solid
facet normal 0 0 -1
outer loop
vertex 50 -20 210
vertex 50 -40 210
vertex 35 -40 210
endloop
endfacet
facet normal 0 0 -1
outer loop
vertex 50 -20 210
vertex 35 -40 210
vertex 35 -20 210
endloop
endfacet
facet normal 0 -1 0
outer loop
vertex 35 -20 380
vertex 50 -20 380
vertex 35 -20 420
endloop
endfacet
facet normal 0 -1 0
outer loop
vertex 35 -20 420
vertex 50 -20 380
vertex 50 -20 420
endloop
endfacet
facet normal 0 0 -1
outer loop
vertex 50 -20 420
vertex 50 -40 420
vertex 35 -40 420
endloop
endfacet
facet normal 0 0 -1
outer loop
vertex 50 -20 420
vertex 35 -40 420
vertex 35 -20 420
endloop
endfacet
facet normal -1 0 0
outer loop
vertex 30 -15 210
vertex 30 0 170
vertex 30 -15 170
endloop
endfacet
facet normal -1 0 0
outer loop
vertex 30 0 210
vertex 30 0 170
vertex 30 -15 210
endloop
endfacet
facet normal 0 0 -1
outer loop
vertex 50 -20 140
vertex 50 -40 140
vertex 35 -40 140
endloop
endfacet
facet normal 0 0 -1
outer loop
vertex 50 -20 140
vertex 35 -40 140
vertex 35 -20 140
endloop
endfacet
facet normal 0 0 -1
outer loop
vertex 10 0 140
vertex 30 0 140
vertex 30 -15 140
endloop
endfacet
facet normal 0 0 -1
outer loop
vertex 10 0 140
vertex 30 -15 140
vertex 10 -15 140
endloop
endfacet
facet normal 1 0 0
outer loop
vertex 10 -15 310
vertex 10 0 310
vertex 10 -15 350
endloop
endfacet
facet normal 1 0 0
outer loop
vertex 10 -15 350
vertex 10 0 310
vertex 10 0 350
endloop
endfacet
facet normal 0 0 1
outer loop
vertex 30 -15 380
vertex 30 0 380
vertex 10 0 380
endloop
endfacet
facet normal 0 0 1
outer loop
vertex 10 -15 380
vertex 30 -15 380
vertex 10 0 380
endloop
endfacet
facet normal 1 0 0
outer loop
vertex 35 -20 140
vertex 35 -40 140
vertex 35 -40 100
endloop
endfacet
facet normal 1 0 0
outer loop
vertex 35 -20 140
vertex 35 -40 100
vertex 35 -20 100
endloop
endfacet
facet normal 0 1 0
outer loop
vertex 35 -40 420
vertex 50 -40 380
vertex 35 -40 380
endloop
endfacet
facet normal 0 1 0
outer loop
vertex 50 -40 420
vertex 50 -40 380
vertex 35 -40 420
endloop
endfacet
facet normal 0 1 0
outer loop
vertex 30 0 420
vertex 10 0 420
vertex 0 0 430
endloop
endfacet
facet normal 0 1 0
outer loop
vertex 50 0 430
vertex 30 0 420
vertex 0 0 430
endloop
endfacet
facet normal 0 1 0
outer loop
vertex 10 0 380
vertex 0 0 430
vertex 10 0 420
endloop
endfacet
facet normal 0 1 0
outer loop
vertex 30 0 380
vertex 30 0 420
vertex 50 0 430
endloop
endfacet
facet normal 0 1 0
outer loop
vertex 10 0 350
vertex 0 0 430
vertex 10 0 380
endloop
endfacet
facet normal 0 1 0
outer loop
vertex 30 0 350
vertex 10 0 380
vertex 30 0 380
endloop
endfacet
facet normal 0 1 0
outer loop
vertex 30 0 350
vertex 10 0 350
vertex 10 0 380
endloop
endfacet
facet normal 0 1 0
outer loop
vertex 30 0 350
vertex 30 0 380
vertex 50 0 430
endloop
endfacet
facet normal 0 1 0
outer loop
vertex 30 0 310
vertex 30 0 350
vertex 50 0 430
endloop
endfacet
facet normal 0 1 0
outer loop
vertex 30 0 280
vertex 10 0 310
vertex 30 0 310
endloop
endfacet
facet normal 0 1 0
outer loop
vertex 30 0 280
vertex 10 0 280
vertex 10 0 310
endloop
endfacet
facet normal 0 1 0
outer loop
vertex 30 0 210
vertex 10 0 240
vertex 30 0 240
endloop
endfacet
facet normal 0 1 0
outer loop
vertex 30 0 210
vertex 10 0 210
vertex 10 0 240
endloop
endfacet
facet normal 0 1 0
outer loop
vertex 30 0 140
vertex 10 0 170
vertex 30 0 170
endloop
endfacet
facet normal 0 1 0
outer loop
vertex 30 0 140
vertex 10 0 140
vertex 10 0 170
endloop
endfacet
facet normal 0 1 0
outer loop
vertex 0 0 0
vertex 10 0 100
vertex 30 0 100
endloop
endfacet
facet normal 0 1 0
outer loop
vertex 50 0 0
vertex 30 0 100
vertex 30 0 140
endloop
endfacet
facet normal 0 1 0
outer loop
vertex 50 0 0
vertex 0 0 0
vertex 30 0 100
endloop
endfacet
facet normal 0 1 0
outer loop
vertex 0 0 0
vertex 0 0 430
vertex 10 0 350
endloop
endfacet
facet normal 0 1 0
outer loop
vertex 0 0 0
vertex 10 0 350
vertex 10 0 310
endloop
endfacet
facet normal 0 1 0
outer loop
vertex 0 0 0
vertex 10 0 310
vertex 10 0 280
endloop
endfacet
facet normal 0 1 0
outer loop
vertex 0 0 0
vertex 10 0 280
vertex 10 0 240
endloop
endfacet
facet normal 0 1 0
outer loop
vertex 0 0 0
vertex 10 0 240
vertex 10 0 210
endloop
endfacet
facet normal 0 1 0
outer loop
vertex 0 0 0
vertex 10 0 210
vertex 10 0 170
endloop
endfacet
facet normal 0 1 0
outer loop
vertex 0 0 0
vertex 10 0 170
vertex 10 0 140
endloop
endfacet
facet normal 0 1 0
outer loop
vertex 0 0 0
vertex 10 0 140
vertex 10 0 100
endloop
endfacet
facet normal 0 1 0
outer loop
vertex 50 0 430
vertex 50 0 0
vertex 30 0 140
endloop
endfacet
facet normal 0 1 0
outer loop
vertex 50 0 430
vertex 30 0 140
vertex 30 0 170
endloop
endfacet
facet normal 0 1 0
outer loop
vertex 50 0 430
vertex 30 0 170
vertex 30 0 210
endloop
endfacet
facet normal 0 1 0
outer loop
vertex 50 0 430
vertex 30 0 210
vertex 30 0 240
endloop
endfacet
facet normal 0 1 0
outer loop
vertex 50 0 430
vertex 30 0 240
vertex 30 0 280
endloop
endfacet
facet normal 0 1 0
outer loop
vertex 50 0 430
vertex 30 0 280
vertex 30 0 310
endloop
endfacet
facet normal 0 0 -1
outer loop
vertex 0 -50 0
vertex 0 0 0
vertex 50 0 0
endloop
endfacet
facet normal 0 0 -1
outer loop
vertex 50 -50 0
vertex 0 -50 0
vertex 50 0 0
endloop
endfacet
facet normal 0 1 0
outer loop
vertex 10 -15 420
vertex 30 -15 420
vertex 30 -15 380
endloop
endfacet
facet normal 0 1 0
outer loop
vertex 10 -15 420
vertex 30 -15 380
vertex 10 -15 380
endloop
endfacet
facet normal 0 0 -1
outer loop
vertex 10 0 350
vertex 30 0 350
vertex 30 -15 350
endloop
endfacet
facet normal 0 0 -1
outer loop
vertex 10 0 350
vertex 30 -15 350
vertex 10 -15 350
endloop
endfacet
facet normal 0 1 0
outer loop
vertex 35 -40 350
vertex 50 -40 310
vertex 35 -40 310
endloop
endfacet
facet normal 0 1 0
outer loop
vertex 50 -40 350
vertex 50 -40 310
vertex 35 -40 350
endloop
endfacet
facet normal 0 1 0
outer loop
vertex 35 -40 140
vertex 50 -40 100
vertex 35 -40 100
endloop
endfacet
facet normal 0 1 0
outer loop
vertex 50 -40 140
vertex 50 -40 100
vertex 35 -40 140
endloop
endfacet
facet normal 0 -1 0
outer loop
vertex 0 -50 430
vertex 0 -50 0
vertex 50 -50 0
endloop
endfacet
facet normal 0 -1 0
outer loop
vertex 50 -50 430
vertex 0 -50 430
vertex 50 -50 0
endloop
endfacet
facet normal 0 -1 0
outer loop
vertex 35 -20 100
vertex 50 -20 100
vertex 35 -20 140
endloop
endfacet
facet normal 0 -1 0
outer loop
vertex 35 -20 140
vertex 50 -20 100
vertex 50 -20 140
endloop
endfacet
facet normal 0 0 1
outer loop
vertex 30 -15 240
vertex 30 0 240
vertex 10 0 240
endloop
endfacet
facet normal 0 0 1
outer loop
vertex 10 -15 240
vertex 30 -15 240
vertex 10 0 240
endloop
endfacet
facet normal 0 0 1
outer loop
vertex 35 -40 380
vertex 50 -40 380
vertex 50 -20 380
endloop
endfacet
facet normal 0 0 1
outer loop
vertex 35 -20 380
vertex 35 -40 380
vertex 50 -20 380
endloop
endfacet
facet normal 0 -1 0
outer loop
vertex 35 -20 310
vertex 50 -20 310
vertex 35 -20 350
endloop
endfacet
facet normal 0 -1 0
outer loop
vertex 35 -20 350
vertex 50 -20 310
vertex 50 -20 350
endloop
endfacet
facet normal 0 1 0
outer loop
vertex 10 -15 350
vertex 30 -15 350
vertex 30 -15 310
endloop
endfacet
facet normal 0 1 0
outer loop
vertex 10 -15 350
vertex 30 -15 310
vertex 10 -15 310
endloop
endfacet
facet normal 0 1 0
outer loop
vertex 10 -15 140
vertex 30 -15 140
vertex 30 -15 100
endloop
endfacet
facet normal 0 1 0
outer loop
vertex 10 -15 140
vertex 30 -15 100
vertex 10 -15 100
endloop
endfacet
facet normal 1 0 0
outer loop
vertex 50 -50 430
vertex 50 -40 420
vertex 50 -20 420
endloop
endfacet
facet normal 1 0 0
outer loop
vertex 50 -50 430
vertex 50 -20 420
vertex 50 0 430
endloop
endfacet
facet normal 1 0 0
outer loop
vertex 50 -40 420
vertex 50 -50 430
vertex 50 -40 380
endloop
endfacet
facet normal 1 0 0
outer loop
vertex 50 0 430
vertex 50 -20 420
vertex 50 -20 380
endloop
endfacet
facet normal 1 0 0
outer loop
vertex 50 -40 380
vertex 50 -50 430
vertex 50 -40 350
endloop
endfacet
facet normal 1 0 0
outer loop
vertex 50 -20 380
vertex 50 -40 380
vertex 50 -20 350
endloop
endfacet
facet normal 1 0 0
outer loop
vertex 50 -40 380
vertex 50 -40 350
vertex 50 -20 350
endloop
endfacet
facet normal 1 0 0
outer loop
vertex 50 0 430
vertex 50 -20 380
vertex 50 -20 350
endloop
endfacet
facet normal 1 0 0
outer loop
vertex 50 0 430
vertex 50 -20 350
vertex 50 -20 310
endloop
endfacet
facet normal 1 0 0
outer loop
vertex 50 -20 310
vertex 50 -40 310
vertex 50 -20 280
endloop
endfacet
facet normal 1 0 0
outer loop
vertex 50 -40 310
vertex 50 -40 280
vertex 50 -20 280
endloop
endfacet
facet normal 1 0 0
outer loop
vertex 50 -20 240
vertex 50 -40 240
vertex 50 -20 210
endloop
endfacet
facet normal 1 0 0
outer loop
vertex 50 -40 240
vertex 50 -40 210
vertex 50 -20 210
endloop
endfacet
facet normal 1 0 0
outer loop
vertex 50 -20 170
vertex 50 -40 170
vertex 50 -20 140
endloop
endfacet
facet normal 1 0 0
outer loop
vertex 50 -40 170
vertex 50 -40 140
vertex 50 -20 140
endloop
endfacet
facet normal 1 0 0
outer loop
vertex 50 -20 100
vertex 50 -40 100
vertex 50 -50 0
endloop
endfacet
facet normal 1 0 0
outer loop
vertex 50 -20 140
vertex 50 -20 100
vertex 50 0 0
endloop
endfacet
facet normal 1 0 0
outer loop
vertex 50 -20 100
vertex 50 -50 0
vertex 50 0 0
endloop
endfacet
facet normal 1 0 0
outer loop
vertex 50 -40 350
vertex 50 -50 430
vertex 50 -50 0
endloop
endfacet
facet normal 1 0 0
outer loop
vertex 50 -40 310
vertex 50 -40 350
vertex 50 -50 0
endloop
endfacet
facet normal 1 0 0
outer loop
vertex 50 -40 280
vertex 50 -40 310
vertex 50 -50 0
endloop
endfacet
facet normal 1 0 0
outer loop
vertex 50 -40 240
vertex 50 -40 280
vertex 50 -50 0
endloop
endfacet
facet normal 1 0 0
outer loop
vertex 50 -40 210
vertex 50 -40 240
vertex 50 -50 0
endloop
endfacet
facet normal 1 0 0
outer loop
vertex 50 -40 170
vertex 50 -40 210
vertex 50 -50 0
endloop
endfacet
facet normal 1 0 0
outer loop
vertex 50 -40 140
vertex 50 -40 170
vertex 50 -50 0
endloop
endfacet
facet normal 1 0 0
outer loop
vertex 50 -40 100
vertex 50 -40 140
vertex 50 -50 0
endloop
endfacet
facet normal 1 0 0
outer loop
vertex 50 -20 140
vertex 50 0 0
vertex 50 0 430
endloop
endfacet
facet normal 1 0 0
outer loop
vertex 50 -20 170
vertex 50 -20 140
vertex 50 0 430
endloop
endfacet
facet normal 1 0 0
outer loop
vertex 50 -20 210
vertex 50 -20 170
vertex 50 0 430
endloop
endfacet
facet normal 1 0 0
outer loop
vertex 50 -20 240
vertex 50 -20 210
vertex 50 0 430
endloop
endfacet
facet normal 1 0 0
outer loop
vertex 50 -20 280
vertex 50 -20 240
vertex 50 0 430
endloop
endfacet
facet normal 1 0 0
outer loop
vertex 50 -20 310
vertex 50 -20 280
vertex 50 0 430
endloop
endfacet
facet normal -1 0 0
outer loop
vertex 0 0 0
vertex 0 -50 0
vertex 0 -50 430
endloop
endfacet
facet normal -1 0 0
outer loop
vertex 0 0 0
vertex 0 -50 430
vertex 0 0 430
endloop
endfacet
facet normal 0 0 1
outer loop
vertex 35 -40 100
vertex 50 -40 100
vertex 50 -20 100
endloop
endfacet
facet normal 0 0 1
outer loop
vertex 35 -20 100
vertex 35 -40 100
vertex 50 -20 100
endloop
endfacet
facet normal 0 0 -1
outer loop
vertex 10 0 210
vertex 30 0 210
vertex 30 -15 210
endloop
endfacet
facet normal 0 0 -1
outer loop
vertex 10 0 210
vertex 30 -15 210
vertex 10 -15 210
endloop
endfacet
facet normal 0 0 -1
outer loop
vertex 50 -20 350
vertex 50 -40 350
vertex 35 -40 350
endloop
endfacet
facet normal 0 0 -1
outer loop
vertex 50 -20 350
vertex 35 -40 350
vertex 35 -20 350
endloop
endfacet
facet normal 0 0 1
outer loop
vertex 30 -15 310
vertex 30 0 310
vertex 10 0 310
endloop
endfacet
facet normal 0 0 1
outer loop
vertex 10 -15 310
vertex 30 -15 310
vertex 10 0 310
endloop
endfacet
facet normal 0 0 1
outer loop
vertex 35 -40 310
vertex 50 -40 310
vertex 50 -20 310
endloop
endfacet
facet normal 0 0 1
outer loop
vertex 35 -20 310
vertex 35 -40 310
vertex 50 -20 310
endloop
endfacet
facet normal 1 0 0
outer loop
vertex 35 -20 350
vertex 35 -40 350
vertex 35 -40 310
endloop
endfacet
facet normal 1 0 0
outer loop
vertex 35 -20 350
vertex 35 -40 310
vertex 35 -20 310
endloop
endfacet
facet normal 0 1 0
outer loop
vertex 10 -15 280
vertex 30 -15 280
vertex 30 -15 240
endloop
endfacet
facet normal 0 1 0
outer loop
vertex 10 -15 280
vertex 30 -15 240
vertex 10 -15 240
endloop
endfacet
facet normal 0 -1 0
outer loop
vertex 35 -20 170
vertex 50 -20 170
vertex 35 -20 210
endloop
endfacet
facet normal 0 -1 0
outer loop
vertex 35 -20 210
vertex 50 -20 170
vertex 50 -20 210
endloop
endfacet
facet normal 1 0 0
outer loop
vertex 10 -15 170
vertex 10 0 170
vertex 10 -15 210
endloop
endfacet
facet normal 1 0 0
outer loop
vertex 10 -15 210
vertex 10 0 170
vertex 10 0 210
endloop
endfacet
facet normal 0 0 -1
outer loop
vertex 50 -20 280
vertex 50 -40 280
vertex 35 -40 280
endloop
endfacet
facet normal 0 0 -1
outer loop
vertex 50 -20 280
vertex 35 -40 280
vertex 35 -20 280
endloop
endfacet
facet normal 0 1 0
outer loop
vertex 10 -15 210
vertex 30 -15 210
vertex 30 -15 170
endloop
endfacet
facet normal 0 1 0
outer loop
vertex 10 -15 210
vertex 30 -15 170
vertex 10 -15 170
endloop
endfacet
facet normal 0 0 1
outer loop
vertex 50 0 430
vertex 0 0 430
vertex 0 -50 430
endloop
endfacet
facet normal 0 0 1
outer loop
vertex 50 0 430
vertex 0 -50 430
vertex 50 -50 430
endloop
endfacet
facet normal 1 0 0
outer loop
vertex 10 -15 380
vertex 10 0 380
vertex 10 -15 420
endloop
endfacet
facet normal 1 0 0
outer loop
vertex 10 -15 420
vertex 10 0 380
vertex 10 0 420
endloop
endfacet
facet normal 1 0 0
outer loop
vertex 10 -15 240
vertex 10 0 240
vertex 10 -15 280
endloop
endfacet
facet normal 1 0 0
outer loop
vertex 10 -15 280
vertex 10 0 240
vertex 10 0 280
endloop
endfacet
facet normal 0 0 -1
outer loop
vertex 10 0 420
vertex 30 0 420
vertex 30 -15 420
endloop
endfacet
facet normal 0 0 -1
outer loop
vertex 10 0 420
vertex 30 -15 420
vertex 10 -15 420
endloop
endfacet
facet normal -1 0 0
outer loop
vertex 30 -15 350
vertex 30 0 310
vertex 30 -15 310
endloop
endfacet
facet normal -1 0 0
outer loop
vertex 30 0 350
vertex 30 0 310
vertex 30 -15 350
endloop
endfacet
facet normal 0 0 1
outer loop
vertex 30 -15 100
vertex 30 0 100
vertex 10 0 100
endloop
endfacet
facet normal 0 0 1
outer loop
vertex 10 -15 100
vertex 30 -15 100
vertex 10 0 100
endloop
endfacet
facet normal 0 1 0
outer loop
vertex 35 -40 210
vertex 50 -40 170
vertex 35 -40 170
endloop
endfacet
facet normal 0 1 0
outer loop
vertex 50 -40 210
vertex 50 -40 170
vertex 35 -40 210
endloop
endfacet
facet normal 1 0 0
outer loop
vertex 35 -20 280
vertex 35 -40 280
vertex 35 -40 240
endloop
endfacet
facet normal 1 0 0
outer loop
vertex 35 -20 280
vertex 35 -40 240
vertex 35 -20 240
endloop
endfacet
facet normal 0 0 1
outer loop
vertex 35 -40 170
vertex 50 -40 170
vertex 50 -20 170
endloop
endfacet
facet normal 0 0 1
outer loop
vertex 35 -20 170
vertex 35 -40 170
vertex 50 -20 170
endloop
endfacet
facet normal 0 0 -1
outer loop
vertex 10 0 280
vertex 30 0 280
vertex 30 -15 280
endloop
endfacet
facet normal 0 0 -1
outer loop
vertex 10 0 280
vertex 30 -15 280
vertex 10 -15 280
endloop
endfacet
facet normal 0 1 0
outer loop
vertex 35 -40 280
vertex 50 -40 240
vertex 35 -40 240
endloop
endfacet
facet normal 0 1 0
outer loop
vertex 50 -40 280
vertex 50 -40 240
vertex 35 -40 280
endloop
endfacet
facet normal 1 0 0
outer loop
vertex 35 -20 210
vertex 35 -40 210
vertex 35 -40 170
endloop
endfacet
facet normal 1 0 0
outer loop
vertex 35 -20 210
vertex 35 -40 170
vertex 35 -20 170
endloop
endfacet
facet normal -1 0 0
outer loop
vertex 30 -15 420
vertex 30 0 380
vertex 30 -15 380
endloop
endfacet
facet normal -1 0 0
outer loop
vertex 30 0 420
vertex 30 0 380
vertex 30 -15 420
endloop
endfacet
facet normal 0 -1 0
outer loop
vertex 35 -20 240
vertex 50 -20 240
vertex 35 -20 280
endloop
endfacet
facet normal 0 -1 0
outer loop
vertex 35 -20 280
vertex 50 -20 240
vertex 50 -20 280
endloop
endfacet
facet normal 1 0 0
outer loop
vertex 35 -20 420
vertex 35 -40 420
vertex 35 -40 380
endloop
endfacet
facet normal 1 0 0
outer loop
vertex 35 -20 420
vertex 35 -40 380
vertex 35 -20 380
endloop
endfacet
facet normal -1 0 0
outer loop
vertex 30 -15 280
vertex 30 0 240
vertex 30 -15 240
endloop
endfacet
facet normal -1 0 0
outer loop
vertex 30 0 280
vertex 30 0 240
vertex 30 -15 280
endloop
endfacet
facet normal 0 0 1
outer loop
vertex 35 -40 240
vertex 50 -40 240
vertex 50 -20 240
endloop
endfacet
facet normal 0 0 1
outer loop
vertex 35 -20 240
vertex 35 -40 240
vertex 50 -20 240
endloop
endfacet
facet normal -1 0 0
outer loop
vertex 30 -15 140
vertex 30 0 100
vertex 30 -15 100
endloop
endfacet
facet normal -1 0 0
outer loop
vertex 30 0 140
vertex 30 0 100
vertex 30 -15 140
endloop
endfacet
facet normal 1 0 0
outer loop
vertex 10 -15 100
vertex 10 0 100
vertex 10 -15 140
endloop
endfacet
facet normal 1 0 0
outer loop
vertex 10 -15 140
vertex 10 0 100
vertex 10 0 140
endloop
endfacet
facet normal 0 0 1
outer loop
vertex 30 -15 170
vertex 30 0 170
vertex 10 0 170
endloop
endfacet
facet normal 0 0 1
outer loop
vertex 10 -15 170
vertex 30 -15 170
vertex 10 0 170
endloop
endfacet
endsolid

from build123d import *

# Parameters (mm, degrees)
F0_W     = 50
F0_H     = 50
F1_DEPTH = 430
F2_W     = 20
F2_H     = 40
F3_DEPTH = 15
F4_W     = 20
F4_H     = 40
F5_DEPTH = 15


with BuildPart() as f1:
    # F0 (on Top) → F1 (new body)
    with BuildSketch(Plane.XY):
        with Locations((25, -25)):
            Rectangle(F0_W, F0_H)
    extrude(amount=F1_DEPTH)

    # F2 (on face) → F3 (cut)
    with BuildSketch(Plane.YZ.offset(50)):
        with Locations((-30, 400)):
            Rectangle(F2_W, F2_H)
        with Locations((-30, 330)):
            Rectangle(F2_W, F2_H)
        with Locations((-30, 260)):
            Rectangle(F2_W, F2_H)
        with Locations((-30, 190)):
            Rectangle(F2_W, F2_H)
        with Locations((-30, 120)):
            Rectangle(F2_W, F2_H)
    extrude(amount=-F3_DEPTH, mode=Mode.SUBTRACT)

    # F4 (on face) → F5 (cut)
    with BuildSketch(Plane(origin=(0, 0, 0), x_dir=(-1, 0, 0), z_dir=(0, 1, 0))):
        with Locations((-20, 400)):
            Rectangle(F4_W, F4_H)
        with Locations((-20, 330)):
            Rectangle(F4_W, F4_H)
        with Locations((-20, 260)):
            Rectangle(F4_W, F4_H)
        with Locations((-20, 190)):
            Rectangle(F4_W, F4_H)
        with Locations((-20, 120)):
            Rectangle(F4_W, F4_H)
    extrude(amount=-F5_DEPTH, mode=Mode.SUBTRACT)


solid = f1.part
